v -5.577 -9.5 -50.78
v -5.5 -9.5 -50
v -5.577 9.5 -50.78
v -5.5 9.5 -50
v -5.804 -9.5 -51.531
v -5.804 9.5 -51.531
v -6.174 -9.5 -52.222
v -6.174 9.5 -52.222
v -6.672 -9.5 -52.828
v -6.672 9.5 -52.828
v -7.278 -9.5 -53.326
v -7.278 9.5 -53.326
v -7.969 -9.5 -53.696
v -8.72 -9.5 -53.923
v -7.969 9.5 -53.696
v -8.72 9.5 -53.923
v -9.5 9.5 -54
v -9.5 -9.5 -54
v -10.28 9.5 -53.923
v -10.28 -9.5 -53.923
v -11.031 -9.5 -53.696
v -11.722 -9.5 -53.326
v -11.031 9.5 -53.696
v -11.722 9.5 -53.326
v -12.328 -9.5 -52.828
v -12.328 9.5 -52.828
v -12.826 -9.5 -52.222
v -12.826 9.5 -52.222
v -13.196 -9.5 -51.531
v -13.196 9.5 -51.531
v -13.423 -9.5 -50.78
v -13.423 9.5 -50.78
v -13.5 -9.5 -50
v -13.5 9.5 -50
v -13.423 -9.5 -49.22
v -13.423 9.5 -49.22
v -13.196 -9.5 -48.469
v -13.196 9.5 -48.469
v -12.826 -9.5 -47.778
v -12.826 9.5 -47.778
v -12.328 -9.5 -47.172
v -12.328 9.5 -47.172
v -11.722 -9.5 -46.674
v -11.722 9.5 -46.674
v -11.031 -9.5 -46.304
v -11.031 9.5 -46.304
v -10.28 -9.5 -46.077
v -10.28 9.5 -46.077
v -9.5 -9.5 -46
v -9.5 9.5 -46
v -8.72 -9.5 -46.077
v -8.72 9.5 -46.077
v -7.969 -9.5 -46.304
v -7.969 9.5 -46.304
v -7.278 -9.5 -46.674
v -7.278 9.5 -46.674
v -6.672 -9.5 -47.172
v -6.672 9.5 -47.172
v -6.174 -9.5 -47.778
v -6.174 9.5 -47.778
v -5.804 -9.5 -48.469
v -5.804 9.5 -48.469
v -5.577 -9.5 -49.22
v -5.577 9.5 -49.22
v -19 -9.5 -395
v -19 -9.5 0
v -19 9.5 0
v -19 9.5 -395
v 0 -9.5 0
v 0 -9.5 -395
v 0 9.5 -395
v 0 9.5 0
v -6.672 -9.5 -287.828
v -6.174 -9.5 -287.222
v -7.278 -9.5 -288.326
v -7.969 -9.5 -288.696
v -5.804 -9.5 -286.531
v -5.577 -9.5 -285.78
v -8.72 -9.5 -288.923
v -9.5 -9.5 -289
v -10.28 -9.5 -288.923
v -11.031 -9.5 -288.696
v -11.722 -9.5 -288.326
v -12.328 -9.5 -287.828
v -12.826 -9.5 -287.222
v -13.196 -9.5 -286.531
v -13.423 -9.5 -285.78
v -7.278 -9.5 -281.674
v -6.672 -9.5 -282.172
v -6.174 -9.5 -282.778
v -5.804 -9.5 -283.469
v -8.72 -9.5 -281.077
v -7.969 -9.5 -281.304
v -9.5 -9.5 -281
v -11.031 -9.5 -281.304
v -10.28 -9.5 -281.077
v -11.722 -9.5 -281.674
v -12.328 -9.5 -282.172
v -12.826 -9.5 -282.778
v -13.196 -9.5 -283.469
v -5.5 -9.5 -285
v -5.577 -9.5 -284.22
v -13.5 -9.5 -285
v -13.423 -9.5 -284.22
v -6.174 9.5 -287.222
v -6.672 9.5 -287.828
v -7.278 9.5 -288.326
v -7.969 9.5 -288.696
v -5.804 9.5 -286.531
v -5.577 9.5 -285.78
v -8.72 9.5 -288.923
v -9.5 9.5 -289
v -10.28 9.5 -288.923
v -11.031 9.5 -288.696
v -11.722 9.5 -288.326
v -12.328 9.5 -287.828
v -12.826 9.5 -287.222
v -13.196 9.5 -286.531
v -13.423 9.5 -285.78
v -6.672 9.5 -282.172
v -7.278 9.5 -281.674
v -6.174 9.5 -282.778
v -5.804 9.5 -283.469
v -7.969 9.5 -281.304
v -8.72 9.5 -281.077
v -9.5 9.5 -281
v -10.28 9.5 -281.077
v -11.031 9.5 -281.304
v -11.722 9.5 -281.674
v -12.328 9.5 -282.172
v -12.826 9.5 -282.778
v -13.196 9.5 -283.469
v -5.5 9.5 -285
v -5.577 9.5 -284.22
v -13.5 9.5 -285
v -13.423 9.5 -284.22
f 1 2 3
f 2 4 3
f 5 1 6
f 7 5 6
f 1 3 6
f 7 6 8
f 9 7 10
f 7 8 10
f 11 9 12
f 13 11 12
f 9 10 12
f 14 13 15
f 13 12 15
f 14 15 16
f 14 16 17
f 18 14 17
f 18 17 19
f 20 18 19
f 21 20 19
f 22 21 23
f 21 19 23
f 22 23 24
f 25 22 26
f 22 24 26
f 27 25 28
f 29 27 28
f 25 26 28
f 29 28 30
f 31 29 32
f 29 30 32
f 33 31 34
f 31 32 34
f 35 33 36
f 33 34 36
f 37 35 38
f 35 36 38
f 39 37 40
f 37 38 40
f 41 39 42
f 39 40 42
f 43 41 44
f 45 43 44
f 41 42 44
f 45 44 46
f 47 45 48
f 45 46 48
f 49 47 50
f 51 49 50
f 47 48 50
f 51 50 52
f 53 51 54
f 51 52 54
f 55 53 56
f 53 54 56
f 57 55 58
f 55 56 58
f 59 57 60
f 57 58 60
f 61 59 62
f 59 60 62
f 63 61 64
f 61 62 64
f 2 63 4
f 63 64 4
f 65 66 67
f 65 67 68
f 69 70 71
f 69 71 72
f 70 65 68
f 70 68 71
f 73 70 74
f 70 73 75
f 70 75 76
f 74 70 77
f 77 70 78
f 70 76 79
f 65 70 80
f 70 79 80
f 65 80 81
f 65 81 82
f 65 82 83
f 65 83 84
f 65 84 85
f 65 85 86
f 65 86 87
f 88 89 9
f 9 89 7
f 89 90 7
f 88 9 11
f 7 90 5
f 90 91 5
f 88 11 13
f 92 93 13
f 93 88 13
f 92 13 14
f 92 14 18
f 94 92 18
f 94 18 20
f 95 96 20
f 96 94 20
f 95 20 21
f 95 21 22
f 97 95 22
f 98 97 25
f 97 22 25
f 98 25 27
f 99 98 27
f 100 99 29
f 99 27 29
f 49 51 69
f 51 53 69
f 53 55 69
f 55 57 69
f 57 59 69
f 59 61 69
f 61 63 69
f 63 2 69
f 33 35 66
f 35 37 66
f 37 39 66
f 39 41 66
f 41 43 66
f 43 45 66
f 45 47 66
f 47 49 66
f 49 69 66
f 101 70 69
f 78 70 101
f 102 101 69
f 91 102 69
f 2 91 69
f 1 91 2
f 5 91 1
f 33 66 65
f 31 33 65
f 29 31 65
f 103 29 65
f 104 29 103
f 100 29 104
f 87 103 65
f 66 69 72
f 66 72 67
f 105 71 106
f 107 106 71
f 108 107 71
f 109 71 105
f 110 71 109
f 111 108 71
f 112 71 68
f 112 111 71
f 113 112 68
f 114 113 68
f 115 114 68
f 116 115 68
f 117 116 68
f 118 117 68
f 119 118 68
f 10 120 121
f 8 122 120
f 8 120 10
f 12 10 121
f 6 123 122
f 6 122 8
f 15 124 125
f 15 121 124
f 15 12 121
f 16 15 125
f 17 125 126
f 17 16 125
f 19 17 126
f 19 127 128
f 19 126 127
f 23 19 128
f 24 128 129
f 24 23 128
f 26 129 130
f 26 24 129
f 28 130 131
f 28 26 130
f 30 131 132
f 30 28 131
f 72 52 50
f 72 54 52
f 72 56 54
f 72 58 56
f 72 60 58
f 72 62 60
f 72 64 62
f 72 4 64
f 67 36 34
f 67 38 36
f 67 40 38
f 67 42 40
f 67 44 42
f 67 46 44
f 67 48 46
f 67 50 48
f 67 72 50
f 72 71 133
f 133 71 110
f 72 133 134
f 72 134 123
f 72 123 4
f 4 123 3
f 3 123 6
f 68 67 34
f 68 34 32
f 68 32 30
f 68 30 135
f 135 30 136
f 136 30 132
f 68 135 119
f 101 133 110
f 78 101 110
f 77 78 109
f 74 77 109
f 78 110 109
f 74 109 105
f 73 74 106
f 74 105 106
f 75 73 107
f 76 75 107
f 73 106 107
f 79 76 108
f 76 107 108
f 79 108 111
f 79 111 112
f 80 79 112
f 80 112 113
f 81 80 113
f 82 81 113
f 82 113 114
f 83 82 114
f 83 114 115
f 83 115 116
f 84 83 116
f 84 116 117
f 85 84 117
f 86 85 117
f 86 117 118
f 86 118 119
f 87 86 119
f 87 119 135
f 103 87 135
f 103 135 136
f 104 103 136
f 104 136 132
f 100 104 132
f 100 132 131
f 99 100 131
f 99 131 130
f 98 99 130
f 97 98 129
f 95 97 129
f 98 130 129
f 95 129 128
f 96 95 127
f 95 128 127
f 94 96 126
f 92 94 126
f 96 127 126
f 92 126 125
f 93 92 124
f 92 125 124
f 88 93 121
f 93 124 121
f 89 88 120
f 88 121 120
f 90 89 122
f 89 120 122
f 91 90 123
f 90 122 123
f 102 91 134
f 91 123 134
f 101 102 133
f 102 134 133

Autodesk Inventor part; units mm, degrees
ref_plane "YZ Plane" through (0, 0, 0) normal (1, 0, 0) x (0, 1, 0)
ref_plane "XZ Plane" through (0, 0, 0) normal (0, 1, 0) x (-1, 0, 0)
ref_plane "XY Plane" through (0, 0, 0) normal (0, 0, 1) x (1, 0, 0)
sketch "Sketch1" plane through (0, 0, 0) normal (0, 1, 0) x (-1, 0, 0)
  line L0 (0, 0) -> (19, 0)
  line L1 (19, 0) -> (19, -395)
  line L2 (19, -395) -> (0, -395)
  line L3 (0, -395) -> (0, 0)
  dimension "d0" = 19
  dimension "d1" = 395
extrude "Extrusion1" add sketch "Sketch1" along normal mid plane 19
sketch "Sketch2" plane through (0, 9.5, 0) normal (0, 1, 0) x (1, 0, 0)
  circle A0 centre (-9.5, 50) radius 4
  circle A1 centre (-9.5, 285) radius 4
  line L0 (-19, 0) -> (0, 0) projected
  line L1 (-19, 395) -> (-19, 0) projected
  line L2 (0, 395) -> (-19, 395) projected
  dimension "d4" = 8
  dimension "d5" = 8
  dimension "d6" = 50
  dimension "d7" = 9.5
  dimension "d8" = 9.5
  dimension "d12" = 235
extrude "Extrusion2" cut sketch "Sketch2" against normal blind 19
properties part number "Base395" material "Steel"
